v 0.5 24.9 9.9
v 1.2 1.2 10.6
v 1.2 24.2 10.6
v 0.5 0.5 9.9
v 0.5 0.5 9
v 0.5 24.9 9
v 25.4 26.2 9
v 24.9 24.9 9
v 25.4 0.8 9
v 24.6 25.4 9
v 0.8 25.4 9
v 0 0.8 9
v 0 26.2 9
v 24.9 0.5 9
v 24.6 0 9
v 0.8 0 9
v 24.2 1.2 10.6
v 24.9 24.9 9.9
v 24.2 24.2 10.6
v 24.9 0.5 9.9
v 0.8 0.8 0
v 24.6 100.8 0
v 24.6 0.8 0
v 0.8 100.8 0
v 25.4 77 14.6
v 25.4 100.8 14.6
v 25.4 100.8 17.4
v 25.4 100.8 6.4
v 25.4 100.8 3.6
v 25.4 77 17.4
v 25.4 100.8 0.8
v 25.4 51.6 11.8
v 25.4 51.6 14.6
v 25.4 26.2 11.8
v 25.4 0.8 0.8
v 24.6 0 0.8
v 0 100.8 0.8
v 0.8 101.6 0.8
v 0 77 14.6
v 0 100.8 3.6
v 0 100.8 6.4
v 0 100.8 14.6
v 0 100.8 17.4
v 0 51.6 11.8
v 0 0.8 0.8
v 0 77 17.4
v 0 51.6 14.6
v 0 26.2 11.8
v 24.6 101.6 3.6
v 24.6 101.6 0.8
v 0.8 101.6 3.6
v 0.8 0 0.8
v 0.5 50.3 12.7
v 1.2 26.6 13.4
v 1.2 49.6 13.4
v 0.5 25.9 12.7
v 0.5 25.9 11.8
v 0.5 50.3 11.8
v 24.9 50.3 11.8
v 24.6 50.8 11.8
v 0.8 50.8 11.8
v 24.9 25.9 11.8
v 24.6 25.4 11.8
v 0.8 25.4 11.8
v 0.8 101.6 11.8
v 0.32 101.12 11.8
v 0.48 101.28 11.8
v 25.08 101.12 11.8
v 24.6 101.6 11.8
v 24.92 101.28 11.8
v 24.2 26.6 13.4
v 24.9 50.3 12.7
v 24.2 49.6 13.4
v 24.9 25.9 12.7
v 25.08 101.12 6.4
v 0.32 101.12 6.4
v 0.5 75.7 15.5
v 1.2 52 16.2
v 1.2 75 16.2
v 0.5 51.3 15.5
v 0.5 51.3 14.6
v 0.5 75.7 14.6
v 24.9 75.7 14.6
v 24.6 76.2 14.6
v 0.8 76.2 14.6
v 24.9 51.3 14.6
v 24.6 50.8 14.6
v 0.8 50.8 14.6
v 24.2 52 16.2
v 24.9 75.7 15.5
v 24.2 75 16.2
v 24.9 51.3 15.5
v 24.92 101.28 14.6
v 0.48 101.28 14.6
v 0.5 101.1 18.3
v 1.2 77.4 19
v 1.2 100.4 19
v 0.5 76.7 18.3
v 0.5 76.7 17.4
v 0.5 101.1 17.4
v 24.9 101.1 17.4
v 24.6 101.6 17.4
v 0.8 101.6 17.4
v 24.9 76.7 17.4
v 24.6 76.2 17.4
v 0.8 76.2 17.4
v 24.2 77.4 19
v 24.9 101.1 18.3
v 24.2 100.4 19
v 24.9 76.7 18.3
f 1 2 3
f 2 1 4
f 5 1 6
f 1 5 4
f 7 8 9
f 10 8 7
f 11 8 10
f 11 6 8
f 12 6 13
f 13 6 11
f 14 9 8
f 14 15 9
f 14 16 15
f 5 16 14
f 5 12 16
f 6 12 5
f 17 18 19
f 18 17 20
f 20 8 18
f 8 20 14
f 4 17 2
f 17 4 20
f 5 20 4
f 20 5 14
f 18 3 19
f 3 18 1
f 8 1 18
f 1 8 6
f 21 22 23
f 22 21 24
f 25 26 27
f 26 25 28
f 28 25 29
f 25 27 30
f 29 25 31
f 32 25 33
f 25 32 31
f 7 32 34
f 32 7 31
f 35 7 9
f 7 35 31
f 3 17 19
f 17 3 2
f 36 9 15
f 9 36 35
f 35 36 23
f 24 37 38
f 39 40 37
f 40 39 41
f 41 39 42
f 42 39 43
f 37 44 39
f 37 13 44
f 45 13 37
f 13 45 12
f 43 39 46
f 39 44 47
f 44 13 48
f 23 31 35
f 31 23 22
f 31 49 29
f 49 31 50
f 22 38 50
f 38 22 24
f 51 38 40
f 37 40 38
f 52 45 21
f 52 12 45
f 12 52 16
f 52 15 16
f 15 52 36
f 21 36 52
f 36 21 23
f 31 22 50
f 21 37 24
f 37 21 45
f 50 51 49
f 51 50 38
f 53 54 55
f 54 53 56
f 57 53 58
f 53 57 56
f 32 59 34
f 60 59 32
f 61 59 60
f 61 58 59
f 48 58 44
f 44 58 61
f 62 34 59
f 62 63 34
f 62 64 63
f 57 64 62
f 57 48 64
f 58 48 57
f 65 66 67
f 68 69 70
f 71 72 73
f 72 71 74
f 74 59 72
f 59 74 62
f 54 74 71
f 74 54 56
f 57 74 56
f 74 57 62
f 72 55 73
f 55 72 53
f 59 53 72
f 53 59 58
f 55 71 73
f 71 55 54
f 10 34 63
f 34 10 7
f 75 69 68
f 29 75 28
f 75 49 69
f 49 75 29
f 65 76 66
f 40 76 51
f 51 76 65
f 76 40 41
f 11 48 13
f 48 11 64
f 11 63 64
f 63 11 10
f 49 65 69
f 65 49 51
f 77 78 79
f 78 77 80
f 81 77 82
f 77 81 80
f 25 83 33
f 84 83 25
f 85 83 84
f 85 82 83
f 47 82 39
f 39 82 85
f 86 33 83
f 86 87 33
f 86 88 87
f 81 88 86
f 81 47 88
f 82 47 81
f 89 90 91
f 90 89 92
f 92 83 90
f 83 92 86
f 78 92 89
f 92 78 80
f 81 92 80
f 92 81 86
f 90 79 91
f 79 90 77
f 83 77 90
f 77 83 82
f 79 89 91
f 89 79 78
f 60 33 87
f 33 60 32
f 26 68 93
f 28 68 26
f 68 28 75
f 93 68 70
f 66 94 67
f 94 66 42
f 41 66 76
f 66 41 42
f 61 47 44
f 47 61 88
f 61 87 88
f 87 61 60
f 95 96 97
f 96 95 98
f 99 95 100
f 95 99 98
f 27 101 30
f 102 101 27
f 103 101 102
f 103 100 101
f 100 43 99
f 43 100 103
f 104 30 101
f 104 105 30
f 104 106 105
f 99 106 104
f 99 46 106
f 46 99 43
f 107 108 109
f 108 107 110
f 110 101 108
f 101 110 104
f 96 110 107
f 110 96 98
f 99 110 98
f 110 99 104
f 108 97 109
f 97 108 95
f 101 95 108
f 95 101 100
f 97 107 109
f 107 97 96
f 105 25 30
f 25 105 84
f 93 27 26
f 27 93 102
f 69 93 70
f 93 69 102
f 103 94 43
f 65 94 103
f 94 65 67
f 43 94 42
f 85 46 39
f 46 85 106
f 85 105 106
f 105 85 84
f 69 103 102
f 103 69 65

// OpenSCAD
// file: wall_01_solid.scad
include <libs.scad>;

//wall
*linear_wall(4);
*round_wall(2);
corner_wall(1);

module linear_wall_base(size)
{
    translate([-wall_width/2,size*basis/2,wall_height/2])hull()
    {
        cube([wall_width-bevel*2,size*basis,wall_height-bevel*2],center=true);
        cube([wall_width-bevel*2,size*basis-bevel*2,wall_height],center=true);
        cube([wall_width,size*basis-bevel*2,wall_height-bevel*2],center=true);
    }
}

module round_wall_base(size)
{
    difference()
    {
        hull()
        {
            translate([0,0,bevel])cylinder(r=size*basis+wall_width,h=wall_height-bevel*2);
            cylinder(r=size*basis+wall_width-bevel,h=wall_height);
        }
        cylinder(r=size*basis,h=wall_height);
        translate([0,0,-ep])cylinder(r1=size*basis+bevel,r2=size*basis,h=bevel);
        translate([0,0,wall_height-bevel+ep])cylinder(r2=size*basis+bevel,r1=size*basis,h=bevel);
    }
}

module linear_brick_grids(size)
{
    //one for each wall level, horizontal
    brick_h=(wall_height-floor_thick)/wall_layers;
    for (ii=[0:wall_layers-1])
    {
        translate([0,size*basis/2,floor_thick+ii*brick_h])rotate([0,45,0])cube([wall_groove*sqrt(2),size*basis*2,wall_groove*sqrt(2)],center=true);
    }
    //vertical
    //one above floor is off by half, then even, then off
    for (ii=[1:1:wall_layers])
    {
        for(jj=[0:.5:size+1])
        {
            translate([0,jj*basis-(ii%6)*basis/6,floor_thick+ii*brick_h-brick_h/2])rotate([0,0,45])cube([wall_groove*sqrt(2),wall_groove*sqrt(2),brick_h],center=true);
        }
    }
}

module round_brick_grids(size)
{
    brick_h=(wall_height-floor_thick)/wall_layers;
    //horizontal
    for (ii=[0:wall_layers-1])
    {
        translate([0,0,floor_thick+ii*brick_h])hull()
        {
            cylinder(r=basis*size+wall_groove,h=ep,center=true);
            cylinder(r=basis*size,h=wall_groove*2,center=true);
        }
    }
    //vertical
    //vertical should be shifted each layer
    for (ii=[1:1:wall_layers])
    {
        for(jj=[0:30/size:120])
        {
            rotate([0,0,jj+(ii%6)*(10/size)])translate([basis*size,0,floor_thick+ii*brick_h-brick_h/2])rotate([0,0,45])cube([wall_groove*sqrt(2),wall_groove*sqrt(2),brick_h],center=true);
        }
    }
}

module round_wall(size)
{
    xx=basis*size+wall_width;
    yy=basis*size+wall_width;
    zz=wall_height;
    difference()
    {
        intersection()
        {
            round_wall_base(size);
            translate([.5*(basis*size+wall_width),.5*(basis*size+wall_width),wall_height/2])hull()
            {
                cube([xx-bevel*2,yy,zz-bevel*2],center=true);
                cube([xx-bevel*2,yy-bevel*2,zz],center=true);
                cube([xx,yy-bevel*2,zz-bevel*2],center=true);
            }
        }
        hull()
        {
            cube([basis*size*2+bevel*2,ep,zz*3],center=true);
            cube([ep,basis*size*2+bevel*2,zz*3],center=true);
        }
        round_brick_grids(size);
    }
}

module linear_wall(size)
{
    difference()
    {
        linear_wall_base(size);
        linear_brick_grids(size);
        *translate([-wall_width,0,0])linear_brick_grids(size);
    }
}

module corner_wall(size)
{
  intersection()
  {
    linear_wall(size);
    //45 degree slope so we can do inside corners
    translate([0,0,0])hull()
    {
      //beveling
      translate([0,0,-ep])linear_extrude(wall_height+ep*2)offset(delta=-bevel)hull()
      {
        translate([0,basis*0.5*size])square([ep,basis*size-wall_tol*2],center=true);
        translate([-wall_width,basis*0.5*size])square([ep,basis*size-wall_tol*2-wall_width*2],center=true);
      }
      translate([0,0,bevel])linear_extrude(wall_height-bevel*2)hull()
      {
        translate([0,basis*0.5*size])square([ep,basis*size-wall_tol*2],center=true);
        translate([-wall_width,basis*0.5*size])square([ep,basis*size-wall_tol*2-wall_width*2],center=true);
      }
    }
  }
}
// file: floor_01_solid.scad
include <libs.scad>;

//floor
*round(2);
diagonal(2,2);
*square_floor(2,2);

//import("AS_full.stl");


module square_floor(xsize,ysize)
{
  difference()
  {
    floor_plate(xsize,ysize);
    grids(xsize,ysize);
  }
}
module diagonal(xsize,ysize)
{
  intersection()
  {
    difference()
    {
      floor_plate(xsize,ysize);
      grids(xsize,ysize);
    }
    translate([0,0,floor_thick/2])hull()
    {
      //we want a slanted portion, so we'll hull two thin slivers that reach to the length
      cube([2*xsize*basis-bevel*2*sqrt(2),ep,floor_thick],center=true);
      cube([2*xsize*basis,ep,floor_thick-bevel*2],center=true);
      cube([ep,2*ysize*basis-bevel*2*sqrt(2),floor_thick],center=true);
      cube([ep,2*ysize*basis,floor_thick-bevel*2],center=true);
    }
    translate([0,0,floor_thick/2])cube([xsize*2*basis-bevel*2,ysize*2*basis-bevel*2,floor_thick],center=true);
  }
}
module round(radius)
{
  intersection()
  {
    difference()
    {
      floor_plate(radius,radius);
      grids(radius,radius);
    }
    hull()
    {
      translate([0,0,bevel])cylinder(r=radius*basis,h=floor_thick-bevel*2,$fn=200);
      cylinder(r=radius*basis-bevel,h=floor_thick,$fn=200);
    }
  }
}
// main file
include <libs.scad>;
use <floor_01_solid.scad>;
use <wall_01_solid.scad>;

open_ascending_stair(1,4);
*translate([basis*2,0,0])open_descending_stair(1,3);
*linear_wall(4);

module open_ascending_stair(width,steps)
{
  for(aa=[1:steps])
  {
    translate([0,basis*(aa-1),step_up*(aa-1)])square_floor(width,steps-(aa-1));
  }
}
module open_descending_stair(width,steps)
{
  for(aa=[1:steps])
  {
    intersection()
    {
      translate([0,0,-step_up*(aa-1)])square_floor(width,aa);
      square_floor(width,steps);
    }
  }
}
